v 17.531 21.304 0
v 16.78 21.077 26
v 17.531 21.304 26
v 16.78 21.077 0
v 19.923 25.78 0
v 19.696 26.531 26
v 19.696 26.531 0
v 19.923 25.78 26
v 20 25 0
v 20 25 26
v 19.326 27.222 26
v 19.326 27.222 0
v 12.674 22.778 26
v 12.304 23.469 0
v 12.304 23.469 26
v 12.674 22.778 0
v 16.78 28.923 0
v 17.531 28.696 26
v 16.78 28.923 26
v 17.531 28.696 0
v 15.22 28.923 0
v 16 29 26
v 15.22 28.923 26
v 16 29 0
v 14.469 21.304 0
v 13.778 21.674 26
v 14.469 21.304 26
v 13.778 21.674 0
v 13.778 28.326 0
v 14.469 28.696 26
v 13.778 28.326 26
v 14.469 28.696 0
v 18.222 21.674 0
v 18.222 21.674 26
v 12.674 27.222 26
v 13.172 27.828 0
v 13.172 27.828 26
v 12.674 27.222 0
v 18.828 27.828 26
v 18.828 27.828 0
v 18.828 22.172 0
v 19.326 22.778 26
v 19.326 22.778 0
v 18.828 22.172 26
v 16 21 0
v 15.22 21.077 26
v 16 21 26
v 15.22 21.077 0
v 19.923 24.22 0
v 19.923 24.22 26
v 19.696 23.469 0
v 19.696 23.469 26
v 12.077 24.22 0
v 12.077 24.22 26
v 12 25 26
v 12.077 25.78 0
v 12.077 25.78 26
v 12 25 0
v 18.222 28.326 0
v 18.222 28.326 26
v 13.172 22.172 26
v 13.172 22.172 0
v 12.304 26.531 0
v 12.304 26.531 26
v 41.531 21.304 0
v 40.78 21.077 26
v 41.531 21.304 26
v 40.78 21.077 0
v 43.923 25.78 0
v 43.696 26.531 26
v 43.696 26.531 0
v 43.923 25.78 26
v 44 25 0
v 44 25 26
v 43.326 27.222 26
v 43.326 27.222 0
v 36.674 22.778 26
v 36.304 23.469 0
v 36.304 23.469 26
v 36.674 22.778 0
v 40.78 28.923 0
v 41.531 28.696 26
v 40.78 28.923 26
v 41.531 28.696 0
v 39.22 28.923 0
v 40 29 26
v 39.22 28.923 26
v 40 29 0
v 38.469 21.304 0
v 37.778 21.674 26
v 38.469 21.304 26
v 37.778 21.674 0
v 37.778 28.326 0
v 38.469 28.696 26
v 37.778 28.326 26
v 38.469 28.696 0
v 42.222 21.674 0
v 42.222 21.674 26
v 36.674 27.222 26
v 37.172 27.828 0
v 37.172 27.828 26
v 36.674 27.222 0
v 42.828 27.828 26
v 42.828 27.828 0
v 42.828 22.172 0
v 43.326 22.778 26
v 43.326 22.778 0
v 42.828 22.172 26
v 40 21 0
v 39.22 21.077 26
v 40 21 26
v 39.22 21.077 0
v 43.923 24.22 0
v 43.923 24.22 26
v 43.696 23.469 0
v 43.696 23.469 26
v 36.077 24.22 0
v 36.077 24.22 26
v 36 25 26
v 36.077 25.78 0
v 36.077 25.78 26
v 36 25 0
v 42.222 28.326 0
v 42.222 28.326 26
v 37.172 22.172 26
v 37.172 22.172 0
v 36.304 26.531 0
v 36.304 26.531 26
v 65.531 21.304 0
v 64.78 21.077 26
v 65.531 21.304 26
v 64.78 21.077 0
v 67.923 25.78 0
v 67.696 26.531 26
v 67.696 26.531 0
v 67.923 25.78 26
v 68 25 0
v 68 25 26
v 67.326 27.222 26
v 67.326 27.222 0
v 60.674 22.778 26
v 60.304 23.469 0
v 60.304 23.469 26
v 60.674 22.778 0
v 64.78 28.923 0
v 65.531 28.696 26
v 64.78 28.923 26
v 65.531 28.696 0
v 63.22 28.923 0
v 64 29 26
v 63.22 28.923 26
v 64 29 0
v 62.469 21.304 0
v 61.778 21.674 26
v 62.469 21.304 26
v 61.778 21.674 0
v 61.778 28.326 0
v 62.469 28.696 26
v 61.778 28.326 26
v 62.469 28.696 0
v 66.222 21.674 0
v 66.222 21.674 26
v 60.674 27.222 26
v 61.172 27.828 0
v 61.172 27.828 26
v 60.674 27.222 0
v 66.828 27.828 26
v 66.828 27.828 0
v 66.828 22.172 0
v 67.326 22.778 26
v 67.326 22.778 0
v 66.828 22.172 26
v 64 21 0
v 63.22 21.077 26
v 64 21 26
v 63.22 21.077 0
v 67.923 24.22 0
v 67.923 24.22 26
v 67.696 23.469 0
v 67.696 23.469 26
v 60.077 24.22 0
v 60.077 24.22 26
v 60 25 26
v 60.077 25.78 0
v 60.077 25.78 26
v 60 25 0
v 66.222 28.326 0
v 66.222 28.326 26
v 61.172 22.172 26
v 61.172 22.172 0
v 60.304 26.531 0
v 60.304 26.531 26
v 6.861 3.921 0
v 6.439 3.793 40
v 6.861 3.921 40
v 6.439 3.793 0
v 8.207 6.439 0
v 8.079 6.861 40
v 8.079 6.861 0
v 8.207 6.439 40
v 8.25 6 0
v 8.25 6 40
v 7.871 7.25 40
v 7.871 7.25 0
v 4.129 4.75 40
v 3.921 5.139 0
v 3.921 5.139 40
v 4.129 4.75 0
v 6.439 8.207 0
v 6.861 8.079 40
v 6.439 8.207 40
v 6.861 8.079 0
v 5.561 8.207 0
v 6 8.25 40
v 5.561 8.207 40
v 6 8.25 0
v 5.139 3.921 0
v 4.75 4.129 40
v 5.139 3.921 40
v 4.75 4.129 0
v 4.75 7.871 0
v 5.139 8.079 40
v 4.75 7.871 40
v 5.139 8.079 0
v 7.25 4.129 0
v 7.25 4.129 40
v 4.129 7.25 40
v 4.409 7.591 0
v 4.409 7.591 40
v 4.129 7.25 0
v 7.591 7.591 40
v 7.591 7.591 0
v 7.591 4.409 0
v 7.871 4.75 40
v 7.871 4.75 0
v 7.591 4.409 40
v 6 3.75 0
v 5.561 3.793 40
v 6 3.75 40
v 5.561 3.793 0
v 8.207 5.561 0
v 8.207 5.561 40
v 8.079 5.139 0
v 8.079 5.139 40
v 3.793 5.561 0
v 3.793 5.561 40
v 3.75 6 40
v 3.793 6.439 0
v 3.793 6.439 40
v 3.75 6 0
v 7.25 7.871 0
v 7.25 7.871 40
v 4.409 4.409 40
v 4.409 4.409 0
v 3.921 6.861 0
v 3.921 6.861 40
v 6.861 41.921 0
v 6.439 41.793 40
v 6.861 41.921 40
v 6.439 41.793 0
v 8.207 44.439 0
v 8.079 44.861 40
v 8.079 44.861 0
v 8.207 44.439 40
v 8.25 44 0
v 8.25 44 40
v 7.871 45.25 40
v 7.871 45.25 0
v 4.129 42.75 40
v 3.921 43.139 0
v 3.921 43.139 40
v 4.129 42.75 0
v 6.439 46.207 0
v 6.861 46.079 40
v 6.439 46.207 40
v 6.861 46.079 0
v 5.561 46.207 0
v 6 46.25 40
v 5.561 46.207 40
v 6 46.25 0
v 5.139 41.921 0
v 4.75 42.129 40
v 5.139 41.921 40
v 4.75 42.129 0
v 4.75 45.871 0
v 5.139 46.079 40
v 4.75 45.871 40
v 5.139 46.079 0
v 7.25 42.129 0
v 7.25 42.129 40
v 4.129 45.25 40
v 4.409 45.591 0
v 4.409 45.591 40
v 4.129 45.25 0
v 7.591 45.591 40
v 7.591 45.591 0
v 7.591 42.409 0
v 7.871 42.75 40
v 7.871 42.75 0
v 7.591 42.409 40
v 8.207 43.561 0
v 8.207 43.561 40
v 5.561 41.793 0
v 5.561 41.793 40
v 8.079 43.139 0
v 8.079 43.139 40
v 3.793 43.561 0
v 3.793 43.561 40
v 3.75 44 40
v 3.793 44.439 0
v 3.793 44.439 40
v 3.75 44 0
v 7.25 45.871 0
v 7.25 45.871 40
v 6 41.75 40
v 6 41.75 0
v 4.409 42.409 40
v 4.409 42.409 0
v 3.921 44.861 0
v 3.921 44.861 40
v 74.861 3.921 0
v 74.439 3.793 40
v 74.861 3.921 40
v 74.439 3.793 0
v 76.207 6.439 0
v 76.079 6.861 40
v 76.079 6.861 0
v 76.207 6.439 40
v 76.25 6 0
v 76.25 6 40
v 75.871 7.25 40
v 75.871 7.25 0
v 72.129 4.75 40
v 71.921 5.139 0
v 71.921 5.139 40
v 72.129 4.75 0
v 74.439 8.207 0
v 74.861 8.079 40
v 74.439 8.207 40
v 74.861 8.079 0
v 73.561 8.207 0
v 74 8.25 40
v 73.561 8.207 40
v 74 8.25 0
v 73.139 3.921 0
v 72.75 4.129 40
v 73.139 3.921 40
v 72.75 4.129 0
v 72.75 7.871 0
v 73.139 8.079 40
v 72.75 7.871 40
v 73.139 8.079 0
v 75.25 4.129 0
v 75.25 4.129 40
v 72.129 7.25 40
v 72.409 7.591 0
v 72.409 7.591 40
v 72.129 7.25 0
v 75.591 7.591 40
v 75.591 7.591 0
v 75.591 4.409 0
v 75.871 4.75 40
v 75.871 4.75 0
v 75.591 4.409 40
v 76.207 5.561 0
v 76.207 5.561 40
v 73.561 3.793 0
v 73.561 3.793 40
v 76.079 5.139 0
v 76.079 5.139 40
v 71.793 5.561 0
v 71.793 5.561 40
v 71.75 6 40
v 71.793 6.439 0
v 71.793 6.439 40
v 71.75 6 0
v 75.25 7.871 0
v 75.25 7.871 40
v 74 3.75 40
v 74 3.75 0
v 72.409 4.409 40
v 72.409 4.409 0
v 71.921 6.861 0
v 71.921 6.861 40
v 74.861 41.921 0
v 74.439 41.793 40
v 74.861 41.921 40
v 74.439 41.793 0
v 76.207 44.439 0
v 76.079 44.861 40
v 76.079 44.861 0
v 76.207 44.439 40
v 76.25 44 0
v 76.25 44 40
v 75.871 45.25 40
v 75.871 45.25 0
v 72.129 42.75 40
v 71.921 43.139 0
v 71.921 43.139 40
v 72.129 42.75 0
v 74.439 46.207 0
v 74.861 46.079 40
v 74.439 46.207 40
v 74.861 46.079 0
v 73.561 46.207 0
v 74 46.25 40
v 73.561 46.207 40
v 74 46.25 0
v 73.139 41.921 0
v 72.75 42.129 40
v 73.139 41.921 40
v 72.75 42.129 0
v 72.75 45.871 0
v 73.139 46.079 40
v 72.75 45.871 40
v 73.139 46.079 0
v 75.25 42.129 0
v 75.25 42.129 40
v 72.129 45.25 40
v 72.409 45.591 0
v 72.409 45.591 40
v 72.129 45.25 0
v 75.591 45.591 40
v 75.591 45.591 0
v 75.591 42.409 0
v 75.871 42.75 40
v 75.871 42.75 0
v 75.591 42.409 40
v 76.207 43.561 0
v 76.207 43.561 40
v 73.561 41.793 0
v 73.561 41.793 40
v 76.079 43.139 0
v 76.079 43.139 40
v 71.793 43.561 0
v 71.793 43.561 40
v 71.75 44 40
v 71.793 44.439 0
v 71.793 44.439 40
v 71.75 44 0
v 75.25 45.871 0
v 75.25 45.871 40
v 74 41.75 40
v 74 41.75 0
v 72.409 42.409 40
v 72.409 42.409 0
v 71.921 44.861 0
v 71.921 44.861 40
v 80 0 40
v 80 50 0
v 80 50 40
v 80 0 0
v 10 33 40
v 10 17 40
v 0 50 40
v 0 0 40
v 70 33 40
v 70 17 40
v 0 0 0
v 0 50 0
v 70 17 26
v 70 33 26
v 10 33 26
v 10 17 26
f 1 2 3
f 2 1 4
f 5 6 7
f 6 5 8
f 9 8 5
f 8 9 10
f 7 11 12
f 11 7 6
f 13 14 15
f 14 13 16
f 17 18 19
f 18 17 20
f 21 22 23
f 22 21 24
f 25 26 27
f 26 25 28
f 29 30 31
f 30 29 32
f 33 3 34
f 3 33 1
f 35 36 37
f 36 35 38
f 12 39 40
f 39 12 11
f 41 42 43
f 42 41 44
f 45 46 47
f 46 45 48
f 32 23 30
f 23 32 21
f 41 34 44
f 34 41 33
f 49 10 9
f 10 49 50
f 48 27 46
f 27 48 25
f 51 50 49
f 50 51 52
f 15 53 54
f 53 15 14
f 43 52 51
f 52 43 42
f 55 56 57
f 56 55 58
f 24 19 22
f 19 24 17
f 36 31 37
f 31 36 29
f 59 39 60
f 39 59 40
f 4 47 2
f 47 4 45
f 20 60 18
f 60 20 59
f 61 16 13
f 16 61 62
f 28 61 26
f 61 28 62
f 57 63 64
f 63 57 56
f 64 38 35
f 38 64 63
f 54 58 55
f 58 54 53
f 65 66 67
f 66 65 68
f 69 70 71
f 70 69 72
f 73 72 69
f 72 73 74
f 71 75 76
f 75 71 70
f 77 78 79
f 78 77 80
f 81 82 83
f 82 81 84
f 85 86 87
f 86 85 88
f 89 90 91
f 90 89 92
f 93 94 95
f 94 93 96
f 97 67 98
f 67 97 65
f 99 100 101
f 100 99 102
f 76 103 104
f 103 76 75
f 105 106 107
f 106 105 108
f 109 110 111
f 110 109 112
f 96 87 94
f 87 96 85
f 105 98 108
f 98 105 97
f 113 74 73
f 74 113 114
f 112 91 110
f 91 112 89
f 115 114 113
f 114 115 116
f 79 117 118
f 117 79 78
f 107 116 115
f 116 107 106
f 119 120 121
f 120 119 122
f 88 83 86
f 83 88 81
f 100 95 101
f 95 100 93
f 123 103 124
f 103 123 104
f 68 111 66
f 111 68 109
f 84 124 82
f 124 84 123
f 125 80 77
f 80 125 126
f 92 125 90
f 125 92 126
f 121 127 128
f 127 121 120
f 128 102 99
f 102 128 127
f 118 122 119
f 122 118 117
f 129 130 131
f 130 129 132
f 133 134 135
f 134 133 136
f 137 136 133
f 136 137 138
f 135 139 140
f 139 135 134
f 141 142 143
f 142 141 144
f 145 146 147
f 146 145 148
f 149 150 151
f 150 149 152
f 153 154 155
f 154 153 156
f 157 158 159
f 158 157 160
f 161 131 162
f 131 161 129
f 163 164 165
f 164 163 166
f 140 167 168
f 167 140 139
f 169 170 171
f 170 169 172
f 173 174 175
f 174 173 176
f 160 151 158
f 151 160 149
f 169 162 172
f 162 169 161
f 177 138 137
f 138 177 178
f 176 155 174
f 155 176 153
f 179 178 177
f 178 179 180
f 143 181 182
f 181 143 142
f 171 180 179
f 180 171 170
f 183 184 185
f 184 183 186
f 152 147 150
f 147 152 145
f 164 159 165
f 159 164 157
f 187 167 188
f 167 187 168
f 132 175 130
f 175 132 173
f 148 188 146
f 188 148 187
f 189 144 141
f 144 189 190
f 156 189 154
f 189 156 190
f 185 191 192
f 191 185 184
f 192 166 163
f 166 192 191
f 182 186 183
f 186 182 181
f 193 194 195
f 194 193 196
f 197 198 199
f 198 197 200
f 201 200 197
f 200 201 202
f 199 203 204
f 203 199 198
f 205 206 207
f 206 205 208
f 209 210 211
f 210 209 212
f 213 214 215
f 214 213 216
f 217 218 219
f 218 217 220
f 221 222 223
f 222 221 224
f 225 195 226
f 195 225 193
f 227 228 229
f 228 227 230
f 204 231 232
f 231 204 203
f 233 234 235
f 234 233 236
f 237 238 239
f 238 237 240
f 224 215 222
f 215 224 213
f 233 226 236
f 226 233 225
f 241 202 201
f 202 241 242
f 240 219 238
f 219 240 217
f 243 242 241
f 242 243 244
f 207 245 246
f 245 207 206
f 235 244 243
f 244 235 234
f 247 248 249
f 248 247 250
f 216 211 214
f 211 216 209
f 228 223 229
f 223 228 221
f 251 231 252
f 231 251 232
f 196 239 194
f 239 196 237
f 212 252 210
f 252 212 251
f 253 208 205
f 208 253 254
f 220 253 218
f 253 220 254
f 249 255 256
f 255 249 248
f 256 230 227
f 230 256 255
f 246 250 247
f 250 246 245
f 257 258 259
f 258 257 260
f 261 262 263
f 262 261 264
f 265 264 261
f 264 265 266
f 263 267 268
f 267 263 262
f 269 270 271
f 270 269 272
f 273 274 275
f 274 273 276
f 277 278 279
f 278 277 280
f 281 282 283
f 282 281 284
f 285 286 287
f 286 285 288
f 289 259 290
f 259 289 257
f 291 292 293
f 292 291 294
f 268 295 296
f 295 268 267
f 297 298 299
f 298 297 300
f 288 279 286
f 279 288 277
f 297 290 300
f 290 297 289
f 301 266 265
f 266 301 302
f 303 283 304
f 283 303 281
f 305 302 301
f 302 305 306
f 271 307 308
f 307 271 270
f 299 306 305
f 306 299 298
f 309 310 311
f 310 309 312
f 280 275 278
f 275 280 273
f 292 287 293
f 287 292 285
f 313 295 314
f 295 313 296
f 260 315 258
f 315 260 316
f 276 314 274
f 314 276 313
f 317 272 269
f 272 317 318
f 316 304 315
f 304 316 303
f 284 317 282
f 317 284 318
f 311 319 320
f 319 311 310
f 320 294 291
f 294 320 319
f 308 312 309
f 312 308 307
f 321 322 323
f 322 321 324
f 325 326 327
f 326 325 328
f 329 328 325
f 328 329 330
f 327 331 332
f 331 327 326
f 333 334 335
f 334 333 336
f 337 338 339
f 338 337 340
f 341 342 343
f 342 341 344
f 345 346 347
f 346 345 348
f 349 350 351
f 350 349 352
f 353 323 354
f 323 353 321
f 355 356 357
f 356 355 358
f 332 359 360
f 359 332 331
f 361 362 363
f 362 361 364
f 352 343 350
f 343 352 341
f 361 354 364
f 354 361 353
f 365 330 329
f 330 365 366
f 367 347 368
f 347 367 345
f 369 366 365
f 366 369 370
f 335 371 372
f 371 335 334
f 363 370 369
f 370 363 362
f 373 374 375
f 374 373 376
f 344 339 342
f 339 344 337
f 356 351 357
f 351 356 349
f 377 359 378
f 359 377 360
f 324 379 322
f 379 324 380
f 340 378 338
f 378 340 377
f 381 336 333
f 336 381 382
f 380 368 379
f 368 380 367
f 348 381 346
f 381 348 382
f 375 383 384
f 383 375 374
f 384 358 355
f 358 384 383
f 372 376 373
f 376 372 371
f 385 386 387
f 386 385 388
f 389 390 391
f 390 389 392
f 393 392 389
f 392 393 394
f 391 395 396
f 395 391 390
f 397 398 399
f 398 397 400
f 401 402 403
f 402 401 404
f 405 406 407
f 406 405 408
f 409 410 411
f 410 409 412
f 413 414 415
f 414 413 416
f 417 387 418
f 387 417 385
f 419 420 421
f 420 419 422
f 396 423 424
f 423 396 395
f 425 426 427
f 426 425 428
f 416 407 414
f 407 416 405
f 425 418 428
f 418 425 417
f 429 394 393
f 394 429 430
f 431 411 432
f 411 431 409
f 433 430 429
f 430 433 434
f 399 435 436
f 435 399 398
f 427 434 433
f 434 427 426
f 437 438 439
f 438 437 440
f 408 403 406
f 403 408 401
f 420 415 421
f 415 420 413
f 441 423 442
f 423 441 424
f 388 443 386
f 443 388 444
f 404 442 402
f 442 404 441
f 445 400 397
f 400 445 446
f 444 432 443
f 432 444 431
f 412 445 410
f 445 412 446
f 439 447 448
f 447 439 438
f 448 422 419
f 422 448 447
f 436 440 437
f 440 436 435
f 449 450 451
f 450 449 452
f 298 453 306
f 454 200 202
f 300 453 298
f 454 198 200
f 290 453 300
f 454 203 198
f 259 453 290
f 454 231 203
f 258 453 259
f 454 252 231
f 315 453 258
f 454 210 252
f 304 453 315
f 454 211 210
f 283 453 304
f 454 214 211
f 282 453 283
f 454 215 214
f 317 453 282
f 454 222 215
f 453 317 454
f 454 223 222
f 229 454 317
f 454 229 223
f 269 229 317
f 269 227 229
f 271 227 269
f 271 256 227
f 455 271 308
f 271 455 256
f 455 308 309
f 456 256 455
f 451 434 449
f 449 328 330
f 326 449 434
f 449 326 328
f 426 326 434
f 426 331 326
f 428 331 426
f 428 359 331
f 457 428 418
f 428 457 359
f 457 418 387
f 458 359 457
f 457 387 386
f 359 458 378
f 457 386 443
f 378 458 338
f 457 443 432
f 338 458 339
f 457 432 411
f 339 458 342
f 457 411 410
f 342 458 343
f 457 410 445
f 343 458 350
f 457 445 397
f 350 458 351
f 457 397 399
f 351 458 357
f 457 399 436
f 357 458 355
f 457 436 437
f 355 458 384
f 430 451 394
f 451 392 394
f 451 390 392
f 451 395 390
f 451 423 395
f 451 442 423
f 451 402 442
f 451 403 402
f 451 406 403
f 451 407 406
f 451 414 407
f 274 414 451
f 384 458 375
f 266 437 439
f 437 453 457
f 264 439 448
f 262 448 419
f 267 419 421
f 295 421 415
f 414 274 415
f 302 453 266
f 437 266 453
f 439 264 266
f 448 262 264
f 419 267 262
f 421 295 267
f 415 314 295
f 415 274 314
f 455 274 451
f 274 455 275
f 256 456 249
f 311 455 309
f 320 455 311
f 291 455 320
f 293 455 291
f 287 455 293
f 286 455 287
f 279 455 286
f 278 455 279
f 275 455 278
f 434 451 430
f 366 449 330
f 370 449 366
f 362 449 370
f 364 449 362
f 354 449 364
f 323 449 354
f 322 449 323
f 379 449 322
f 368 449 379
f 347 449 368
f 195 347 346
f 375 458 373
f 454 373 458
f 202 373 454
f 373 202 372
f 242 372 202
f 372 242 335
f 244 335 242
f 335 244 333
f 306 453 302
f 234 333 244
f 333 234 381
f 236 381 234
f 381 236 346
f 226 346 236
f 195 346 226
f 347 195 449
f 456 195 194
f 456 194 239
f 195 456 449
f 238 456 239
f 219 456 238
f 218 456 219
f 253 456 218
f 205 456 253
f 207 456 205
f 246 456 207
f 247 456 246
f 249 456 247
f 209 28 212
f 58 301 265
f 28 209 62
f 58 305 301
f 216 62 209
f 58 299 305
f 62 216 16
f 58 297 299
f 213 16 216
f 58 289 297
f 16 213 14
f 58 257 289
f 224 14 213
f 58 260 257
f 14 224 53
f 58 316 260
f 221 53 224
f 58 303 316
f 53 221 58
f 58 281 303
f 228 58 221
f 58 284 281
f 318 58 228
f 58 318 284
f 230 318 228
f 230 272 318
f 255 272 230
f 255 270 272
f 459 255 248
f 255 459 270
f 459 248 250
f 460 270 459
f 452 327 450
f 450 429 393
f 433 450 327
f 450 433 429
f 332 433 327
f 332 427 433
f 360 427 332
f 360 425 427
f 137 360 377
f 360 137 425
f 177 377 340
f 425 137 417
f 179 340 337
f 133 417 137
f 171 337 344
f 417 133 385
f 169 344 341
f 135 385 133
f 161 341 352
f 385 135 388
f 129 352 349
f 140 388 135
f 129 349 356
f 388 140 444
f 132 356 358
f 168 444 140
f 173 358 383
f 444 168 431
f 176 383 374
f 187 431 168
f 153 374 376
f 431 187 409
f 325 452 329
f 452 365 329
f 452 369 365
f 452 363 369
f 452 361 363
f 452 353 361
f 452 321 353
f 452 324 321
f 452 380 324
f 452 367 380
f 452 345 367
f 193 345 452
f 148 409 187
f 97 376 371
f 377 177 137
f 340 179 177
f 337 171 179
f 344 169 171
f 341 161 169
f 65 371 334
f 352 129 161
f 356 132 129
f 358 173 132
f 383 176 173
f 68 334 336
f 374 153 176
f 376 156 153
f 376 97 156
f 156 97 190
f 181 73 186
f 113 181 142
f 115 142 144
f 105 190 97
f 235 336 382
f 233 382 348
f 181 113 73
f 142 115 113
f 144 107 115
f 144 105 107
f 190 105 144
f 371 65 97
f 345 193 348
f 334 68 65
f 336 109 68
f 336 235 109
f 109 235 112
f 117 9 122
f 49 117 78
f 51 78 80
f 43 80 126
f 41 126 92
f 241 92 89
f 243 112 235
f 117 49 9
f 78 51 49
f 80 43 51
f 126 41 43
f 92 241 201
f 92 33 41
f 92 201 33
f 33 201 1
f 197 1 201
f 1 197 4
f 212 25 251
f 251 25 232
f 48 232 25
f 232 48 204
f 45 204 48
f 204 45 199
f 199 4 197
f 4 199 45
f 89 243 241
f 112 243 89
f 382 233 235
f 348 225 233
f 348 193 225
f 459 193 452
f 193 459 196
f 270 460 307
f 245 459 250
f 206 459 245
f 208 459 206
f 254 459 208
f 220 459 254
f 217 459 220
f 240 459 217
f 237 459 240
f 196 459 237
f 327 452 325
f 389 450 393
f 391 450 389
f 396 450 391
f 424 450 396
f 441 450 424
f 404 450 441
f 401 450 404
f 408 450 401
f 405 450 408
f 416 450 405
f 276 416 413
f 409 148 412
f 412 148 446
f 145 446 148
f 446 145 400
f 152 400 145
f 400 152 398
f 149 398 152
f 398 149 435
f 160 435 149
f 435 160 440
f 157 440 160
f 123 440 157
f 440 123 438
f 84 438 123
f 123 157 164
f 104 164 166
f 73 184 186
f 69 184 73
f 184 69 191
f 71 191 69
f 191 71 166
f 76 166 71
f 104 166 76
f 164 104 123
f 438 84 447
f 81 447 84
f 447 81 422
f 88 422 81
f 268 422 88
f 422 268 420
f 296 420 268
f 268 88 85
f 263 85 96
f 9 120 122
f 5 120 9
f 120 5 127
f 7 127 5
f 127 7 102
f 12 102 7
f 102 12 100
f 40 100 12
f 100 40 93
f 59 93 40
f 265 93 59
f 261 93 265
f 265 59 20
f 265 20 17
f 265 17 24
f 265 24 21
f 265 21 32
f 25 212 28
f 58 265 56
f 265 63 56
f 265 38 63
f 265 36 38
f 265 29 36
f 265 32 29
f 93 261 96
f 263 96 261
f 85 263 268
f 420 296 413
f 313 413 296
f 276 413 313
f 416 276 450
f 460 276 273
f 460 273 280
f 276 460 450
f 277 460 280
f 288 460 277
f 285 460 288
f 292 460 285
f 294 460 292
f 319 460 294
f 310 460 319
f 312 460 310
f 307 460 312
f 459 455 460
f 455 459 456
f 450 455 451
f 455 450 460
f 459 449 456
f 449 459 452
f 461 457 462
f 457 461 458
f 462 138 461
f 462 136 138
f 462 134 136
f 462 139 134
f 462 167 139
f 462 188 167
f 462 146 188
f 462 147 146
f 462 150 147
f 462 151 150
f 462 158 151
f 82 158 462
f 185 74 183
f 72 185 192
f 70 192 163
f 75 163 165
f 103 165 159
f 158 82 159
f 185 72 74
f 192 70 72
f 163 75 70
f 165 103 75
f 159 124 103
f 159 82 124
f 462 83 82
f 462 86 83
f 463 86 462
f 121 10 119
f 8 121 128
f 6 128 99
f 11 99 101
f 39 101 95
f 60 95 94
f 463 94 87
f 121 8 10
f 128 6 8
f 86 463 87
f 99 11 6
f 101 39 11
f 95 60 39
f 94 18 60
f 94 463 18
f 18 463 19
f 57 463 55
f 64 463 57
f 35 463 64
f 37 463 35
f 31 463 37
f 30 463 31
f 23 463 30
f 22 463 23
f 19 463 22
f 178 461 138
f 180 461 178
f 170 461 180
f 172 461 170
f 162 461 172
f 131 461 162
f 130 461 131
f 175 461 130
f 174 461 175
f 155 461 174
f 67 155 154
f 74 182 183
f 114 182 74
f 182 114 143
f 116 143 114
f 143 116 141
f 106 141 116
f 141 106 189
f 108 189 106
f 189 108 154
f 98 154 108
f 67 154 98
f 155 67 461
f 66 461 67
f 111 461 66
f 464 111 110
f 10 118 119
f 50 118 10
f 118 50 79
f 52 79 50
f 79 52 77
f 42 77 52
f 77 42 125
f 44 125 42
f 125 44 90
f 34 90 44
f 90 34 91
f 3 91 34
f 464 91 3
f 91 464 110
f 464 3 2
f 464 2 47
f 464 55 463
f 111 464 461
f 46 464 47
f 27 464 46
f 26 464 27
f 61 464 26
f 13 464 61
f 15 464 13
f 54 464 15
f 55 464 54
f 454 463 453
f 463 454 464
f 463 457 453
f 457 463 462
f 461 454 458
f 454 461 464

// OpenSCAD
$fn = 32;

// ----------------------------------------------------------------------
// Manifold block: gallery_top manifold
// ----------------------------------------------------------------------

// --- parameters (mm) ---
block_l = 80;             // block length, X
block_w = 50;             // block width, Y
block_h = 40;             // block height, Z
port_d = 8;               // port bore diameter
port_pitch = 24;          // port pitch along X
gallery_d = 16;           // top gallery width, Y
gallery_depth = 14;       // gallery pocket depth
wall_p = 10;              // gallery end wall thickness, X
mnt_d = 4.5;              // mounting hole diameter
mnt_in = 6;               // mounting hole inset from the edges

n_ports = 3;  // ports in the row
port_x0 = (block_l - (n_ports - 1) * port_pitch) / 2;  // first port X

difference() {
  cube([block_l, block_w, block_h]);
  for (i = [0 : n_ports - 1])
    translate([port_x0 + i * port_pitch, block_w / 2, -1])
      cylinder(h = block_h + 2, d = port_d);
  translate([wall_p, block_w / 2 - gallery_d / 2, block_h - gallery_depth])
    cube([block_l - 2 * wall_p, gallery_d, gallery_depth + 1]);
  for (cx = [mnt_in, block_l - mnt_in])
    for (cy = [mnt_in, block_w - mnt_in])
      translate([cx, cy, -1]) cylinder(h = block_h + 2, d = mnt_d);
}
